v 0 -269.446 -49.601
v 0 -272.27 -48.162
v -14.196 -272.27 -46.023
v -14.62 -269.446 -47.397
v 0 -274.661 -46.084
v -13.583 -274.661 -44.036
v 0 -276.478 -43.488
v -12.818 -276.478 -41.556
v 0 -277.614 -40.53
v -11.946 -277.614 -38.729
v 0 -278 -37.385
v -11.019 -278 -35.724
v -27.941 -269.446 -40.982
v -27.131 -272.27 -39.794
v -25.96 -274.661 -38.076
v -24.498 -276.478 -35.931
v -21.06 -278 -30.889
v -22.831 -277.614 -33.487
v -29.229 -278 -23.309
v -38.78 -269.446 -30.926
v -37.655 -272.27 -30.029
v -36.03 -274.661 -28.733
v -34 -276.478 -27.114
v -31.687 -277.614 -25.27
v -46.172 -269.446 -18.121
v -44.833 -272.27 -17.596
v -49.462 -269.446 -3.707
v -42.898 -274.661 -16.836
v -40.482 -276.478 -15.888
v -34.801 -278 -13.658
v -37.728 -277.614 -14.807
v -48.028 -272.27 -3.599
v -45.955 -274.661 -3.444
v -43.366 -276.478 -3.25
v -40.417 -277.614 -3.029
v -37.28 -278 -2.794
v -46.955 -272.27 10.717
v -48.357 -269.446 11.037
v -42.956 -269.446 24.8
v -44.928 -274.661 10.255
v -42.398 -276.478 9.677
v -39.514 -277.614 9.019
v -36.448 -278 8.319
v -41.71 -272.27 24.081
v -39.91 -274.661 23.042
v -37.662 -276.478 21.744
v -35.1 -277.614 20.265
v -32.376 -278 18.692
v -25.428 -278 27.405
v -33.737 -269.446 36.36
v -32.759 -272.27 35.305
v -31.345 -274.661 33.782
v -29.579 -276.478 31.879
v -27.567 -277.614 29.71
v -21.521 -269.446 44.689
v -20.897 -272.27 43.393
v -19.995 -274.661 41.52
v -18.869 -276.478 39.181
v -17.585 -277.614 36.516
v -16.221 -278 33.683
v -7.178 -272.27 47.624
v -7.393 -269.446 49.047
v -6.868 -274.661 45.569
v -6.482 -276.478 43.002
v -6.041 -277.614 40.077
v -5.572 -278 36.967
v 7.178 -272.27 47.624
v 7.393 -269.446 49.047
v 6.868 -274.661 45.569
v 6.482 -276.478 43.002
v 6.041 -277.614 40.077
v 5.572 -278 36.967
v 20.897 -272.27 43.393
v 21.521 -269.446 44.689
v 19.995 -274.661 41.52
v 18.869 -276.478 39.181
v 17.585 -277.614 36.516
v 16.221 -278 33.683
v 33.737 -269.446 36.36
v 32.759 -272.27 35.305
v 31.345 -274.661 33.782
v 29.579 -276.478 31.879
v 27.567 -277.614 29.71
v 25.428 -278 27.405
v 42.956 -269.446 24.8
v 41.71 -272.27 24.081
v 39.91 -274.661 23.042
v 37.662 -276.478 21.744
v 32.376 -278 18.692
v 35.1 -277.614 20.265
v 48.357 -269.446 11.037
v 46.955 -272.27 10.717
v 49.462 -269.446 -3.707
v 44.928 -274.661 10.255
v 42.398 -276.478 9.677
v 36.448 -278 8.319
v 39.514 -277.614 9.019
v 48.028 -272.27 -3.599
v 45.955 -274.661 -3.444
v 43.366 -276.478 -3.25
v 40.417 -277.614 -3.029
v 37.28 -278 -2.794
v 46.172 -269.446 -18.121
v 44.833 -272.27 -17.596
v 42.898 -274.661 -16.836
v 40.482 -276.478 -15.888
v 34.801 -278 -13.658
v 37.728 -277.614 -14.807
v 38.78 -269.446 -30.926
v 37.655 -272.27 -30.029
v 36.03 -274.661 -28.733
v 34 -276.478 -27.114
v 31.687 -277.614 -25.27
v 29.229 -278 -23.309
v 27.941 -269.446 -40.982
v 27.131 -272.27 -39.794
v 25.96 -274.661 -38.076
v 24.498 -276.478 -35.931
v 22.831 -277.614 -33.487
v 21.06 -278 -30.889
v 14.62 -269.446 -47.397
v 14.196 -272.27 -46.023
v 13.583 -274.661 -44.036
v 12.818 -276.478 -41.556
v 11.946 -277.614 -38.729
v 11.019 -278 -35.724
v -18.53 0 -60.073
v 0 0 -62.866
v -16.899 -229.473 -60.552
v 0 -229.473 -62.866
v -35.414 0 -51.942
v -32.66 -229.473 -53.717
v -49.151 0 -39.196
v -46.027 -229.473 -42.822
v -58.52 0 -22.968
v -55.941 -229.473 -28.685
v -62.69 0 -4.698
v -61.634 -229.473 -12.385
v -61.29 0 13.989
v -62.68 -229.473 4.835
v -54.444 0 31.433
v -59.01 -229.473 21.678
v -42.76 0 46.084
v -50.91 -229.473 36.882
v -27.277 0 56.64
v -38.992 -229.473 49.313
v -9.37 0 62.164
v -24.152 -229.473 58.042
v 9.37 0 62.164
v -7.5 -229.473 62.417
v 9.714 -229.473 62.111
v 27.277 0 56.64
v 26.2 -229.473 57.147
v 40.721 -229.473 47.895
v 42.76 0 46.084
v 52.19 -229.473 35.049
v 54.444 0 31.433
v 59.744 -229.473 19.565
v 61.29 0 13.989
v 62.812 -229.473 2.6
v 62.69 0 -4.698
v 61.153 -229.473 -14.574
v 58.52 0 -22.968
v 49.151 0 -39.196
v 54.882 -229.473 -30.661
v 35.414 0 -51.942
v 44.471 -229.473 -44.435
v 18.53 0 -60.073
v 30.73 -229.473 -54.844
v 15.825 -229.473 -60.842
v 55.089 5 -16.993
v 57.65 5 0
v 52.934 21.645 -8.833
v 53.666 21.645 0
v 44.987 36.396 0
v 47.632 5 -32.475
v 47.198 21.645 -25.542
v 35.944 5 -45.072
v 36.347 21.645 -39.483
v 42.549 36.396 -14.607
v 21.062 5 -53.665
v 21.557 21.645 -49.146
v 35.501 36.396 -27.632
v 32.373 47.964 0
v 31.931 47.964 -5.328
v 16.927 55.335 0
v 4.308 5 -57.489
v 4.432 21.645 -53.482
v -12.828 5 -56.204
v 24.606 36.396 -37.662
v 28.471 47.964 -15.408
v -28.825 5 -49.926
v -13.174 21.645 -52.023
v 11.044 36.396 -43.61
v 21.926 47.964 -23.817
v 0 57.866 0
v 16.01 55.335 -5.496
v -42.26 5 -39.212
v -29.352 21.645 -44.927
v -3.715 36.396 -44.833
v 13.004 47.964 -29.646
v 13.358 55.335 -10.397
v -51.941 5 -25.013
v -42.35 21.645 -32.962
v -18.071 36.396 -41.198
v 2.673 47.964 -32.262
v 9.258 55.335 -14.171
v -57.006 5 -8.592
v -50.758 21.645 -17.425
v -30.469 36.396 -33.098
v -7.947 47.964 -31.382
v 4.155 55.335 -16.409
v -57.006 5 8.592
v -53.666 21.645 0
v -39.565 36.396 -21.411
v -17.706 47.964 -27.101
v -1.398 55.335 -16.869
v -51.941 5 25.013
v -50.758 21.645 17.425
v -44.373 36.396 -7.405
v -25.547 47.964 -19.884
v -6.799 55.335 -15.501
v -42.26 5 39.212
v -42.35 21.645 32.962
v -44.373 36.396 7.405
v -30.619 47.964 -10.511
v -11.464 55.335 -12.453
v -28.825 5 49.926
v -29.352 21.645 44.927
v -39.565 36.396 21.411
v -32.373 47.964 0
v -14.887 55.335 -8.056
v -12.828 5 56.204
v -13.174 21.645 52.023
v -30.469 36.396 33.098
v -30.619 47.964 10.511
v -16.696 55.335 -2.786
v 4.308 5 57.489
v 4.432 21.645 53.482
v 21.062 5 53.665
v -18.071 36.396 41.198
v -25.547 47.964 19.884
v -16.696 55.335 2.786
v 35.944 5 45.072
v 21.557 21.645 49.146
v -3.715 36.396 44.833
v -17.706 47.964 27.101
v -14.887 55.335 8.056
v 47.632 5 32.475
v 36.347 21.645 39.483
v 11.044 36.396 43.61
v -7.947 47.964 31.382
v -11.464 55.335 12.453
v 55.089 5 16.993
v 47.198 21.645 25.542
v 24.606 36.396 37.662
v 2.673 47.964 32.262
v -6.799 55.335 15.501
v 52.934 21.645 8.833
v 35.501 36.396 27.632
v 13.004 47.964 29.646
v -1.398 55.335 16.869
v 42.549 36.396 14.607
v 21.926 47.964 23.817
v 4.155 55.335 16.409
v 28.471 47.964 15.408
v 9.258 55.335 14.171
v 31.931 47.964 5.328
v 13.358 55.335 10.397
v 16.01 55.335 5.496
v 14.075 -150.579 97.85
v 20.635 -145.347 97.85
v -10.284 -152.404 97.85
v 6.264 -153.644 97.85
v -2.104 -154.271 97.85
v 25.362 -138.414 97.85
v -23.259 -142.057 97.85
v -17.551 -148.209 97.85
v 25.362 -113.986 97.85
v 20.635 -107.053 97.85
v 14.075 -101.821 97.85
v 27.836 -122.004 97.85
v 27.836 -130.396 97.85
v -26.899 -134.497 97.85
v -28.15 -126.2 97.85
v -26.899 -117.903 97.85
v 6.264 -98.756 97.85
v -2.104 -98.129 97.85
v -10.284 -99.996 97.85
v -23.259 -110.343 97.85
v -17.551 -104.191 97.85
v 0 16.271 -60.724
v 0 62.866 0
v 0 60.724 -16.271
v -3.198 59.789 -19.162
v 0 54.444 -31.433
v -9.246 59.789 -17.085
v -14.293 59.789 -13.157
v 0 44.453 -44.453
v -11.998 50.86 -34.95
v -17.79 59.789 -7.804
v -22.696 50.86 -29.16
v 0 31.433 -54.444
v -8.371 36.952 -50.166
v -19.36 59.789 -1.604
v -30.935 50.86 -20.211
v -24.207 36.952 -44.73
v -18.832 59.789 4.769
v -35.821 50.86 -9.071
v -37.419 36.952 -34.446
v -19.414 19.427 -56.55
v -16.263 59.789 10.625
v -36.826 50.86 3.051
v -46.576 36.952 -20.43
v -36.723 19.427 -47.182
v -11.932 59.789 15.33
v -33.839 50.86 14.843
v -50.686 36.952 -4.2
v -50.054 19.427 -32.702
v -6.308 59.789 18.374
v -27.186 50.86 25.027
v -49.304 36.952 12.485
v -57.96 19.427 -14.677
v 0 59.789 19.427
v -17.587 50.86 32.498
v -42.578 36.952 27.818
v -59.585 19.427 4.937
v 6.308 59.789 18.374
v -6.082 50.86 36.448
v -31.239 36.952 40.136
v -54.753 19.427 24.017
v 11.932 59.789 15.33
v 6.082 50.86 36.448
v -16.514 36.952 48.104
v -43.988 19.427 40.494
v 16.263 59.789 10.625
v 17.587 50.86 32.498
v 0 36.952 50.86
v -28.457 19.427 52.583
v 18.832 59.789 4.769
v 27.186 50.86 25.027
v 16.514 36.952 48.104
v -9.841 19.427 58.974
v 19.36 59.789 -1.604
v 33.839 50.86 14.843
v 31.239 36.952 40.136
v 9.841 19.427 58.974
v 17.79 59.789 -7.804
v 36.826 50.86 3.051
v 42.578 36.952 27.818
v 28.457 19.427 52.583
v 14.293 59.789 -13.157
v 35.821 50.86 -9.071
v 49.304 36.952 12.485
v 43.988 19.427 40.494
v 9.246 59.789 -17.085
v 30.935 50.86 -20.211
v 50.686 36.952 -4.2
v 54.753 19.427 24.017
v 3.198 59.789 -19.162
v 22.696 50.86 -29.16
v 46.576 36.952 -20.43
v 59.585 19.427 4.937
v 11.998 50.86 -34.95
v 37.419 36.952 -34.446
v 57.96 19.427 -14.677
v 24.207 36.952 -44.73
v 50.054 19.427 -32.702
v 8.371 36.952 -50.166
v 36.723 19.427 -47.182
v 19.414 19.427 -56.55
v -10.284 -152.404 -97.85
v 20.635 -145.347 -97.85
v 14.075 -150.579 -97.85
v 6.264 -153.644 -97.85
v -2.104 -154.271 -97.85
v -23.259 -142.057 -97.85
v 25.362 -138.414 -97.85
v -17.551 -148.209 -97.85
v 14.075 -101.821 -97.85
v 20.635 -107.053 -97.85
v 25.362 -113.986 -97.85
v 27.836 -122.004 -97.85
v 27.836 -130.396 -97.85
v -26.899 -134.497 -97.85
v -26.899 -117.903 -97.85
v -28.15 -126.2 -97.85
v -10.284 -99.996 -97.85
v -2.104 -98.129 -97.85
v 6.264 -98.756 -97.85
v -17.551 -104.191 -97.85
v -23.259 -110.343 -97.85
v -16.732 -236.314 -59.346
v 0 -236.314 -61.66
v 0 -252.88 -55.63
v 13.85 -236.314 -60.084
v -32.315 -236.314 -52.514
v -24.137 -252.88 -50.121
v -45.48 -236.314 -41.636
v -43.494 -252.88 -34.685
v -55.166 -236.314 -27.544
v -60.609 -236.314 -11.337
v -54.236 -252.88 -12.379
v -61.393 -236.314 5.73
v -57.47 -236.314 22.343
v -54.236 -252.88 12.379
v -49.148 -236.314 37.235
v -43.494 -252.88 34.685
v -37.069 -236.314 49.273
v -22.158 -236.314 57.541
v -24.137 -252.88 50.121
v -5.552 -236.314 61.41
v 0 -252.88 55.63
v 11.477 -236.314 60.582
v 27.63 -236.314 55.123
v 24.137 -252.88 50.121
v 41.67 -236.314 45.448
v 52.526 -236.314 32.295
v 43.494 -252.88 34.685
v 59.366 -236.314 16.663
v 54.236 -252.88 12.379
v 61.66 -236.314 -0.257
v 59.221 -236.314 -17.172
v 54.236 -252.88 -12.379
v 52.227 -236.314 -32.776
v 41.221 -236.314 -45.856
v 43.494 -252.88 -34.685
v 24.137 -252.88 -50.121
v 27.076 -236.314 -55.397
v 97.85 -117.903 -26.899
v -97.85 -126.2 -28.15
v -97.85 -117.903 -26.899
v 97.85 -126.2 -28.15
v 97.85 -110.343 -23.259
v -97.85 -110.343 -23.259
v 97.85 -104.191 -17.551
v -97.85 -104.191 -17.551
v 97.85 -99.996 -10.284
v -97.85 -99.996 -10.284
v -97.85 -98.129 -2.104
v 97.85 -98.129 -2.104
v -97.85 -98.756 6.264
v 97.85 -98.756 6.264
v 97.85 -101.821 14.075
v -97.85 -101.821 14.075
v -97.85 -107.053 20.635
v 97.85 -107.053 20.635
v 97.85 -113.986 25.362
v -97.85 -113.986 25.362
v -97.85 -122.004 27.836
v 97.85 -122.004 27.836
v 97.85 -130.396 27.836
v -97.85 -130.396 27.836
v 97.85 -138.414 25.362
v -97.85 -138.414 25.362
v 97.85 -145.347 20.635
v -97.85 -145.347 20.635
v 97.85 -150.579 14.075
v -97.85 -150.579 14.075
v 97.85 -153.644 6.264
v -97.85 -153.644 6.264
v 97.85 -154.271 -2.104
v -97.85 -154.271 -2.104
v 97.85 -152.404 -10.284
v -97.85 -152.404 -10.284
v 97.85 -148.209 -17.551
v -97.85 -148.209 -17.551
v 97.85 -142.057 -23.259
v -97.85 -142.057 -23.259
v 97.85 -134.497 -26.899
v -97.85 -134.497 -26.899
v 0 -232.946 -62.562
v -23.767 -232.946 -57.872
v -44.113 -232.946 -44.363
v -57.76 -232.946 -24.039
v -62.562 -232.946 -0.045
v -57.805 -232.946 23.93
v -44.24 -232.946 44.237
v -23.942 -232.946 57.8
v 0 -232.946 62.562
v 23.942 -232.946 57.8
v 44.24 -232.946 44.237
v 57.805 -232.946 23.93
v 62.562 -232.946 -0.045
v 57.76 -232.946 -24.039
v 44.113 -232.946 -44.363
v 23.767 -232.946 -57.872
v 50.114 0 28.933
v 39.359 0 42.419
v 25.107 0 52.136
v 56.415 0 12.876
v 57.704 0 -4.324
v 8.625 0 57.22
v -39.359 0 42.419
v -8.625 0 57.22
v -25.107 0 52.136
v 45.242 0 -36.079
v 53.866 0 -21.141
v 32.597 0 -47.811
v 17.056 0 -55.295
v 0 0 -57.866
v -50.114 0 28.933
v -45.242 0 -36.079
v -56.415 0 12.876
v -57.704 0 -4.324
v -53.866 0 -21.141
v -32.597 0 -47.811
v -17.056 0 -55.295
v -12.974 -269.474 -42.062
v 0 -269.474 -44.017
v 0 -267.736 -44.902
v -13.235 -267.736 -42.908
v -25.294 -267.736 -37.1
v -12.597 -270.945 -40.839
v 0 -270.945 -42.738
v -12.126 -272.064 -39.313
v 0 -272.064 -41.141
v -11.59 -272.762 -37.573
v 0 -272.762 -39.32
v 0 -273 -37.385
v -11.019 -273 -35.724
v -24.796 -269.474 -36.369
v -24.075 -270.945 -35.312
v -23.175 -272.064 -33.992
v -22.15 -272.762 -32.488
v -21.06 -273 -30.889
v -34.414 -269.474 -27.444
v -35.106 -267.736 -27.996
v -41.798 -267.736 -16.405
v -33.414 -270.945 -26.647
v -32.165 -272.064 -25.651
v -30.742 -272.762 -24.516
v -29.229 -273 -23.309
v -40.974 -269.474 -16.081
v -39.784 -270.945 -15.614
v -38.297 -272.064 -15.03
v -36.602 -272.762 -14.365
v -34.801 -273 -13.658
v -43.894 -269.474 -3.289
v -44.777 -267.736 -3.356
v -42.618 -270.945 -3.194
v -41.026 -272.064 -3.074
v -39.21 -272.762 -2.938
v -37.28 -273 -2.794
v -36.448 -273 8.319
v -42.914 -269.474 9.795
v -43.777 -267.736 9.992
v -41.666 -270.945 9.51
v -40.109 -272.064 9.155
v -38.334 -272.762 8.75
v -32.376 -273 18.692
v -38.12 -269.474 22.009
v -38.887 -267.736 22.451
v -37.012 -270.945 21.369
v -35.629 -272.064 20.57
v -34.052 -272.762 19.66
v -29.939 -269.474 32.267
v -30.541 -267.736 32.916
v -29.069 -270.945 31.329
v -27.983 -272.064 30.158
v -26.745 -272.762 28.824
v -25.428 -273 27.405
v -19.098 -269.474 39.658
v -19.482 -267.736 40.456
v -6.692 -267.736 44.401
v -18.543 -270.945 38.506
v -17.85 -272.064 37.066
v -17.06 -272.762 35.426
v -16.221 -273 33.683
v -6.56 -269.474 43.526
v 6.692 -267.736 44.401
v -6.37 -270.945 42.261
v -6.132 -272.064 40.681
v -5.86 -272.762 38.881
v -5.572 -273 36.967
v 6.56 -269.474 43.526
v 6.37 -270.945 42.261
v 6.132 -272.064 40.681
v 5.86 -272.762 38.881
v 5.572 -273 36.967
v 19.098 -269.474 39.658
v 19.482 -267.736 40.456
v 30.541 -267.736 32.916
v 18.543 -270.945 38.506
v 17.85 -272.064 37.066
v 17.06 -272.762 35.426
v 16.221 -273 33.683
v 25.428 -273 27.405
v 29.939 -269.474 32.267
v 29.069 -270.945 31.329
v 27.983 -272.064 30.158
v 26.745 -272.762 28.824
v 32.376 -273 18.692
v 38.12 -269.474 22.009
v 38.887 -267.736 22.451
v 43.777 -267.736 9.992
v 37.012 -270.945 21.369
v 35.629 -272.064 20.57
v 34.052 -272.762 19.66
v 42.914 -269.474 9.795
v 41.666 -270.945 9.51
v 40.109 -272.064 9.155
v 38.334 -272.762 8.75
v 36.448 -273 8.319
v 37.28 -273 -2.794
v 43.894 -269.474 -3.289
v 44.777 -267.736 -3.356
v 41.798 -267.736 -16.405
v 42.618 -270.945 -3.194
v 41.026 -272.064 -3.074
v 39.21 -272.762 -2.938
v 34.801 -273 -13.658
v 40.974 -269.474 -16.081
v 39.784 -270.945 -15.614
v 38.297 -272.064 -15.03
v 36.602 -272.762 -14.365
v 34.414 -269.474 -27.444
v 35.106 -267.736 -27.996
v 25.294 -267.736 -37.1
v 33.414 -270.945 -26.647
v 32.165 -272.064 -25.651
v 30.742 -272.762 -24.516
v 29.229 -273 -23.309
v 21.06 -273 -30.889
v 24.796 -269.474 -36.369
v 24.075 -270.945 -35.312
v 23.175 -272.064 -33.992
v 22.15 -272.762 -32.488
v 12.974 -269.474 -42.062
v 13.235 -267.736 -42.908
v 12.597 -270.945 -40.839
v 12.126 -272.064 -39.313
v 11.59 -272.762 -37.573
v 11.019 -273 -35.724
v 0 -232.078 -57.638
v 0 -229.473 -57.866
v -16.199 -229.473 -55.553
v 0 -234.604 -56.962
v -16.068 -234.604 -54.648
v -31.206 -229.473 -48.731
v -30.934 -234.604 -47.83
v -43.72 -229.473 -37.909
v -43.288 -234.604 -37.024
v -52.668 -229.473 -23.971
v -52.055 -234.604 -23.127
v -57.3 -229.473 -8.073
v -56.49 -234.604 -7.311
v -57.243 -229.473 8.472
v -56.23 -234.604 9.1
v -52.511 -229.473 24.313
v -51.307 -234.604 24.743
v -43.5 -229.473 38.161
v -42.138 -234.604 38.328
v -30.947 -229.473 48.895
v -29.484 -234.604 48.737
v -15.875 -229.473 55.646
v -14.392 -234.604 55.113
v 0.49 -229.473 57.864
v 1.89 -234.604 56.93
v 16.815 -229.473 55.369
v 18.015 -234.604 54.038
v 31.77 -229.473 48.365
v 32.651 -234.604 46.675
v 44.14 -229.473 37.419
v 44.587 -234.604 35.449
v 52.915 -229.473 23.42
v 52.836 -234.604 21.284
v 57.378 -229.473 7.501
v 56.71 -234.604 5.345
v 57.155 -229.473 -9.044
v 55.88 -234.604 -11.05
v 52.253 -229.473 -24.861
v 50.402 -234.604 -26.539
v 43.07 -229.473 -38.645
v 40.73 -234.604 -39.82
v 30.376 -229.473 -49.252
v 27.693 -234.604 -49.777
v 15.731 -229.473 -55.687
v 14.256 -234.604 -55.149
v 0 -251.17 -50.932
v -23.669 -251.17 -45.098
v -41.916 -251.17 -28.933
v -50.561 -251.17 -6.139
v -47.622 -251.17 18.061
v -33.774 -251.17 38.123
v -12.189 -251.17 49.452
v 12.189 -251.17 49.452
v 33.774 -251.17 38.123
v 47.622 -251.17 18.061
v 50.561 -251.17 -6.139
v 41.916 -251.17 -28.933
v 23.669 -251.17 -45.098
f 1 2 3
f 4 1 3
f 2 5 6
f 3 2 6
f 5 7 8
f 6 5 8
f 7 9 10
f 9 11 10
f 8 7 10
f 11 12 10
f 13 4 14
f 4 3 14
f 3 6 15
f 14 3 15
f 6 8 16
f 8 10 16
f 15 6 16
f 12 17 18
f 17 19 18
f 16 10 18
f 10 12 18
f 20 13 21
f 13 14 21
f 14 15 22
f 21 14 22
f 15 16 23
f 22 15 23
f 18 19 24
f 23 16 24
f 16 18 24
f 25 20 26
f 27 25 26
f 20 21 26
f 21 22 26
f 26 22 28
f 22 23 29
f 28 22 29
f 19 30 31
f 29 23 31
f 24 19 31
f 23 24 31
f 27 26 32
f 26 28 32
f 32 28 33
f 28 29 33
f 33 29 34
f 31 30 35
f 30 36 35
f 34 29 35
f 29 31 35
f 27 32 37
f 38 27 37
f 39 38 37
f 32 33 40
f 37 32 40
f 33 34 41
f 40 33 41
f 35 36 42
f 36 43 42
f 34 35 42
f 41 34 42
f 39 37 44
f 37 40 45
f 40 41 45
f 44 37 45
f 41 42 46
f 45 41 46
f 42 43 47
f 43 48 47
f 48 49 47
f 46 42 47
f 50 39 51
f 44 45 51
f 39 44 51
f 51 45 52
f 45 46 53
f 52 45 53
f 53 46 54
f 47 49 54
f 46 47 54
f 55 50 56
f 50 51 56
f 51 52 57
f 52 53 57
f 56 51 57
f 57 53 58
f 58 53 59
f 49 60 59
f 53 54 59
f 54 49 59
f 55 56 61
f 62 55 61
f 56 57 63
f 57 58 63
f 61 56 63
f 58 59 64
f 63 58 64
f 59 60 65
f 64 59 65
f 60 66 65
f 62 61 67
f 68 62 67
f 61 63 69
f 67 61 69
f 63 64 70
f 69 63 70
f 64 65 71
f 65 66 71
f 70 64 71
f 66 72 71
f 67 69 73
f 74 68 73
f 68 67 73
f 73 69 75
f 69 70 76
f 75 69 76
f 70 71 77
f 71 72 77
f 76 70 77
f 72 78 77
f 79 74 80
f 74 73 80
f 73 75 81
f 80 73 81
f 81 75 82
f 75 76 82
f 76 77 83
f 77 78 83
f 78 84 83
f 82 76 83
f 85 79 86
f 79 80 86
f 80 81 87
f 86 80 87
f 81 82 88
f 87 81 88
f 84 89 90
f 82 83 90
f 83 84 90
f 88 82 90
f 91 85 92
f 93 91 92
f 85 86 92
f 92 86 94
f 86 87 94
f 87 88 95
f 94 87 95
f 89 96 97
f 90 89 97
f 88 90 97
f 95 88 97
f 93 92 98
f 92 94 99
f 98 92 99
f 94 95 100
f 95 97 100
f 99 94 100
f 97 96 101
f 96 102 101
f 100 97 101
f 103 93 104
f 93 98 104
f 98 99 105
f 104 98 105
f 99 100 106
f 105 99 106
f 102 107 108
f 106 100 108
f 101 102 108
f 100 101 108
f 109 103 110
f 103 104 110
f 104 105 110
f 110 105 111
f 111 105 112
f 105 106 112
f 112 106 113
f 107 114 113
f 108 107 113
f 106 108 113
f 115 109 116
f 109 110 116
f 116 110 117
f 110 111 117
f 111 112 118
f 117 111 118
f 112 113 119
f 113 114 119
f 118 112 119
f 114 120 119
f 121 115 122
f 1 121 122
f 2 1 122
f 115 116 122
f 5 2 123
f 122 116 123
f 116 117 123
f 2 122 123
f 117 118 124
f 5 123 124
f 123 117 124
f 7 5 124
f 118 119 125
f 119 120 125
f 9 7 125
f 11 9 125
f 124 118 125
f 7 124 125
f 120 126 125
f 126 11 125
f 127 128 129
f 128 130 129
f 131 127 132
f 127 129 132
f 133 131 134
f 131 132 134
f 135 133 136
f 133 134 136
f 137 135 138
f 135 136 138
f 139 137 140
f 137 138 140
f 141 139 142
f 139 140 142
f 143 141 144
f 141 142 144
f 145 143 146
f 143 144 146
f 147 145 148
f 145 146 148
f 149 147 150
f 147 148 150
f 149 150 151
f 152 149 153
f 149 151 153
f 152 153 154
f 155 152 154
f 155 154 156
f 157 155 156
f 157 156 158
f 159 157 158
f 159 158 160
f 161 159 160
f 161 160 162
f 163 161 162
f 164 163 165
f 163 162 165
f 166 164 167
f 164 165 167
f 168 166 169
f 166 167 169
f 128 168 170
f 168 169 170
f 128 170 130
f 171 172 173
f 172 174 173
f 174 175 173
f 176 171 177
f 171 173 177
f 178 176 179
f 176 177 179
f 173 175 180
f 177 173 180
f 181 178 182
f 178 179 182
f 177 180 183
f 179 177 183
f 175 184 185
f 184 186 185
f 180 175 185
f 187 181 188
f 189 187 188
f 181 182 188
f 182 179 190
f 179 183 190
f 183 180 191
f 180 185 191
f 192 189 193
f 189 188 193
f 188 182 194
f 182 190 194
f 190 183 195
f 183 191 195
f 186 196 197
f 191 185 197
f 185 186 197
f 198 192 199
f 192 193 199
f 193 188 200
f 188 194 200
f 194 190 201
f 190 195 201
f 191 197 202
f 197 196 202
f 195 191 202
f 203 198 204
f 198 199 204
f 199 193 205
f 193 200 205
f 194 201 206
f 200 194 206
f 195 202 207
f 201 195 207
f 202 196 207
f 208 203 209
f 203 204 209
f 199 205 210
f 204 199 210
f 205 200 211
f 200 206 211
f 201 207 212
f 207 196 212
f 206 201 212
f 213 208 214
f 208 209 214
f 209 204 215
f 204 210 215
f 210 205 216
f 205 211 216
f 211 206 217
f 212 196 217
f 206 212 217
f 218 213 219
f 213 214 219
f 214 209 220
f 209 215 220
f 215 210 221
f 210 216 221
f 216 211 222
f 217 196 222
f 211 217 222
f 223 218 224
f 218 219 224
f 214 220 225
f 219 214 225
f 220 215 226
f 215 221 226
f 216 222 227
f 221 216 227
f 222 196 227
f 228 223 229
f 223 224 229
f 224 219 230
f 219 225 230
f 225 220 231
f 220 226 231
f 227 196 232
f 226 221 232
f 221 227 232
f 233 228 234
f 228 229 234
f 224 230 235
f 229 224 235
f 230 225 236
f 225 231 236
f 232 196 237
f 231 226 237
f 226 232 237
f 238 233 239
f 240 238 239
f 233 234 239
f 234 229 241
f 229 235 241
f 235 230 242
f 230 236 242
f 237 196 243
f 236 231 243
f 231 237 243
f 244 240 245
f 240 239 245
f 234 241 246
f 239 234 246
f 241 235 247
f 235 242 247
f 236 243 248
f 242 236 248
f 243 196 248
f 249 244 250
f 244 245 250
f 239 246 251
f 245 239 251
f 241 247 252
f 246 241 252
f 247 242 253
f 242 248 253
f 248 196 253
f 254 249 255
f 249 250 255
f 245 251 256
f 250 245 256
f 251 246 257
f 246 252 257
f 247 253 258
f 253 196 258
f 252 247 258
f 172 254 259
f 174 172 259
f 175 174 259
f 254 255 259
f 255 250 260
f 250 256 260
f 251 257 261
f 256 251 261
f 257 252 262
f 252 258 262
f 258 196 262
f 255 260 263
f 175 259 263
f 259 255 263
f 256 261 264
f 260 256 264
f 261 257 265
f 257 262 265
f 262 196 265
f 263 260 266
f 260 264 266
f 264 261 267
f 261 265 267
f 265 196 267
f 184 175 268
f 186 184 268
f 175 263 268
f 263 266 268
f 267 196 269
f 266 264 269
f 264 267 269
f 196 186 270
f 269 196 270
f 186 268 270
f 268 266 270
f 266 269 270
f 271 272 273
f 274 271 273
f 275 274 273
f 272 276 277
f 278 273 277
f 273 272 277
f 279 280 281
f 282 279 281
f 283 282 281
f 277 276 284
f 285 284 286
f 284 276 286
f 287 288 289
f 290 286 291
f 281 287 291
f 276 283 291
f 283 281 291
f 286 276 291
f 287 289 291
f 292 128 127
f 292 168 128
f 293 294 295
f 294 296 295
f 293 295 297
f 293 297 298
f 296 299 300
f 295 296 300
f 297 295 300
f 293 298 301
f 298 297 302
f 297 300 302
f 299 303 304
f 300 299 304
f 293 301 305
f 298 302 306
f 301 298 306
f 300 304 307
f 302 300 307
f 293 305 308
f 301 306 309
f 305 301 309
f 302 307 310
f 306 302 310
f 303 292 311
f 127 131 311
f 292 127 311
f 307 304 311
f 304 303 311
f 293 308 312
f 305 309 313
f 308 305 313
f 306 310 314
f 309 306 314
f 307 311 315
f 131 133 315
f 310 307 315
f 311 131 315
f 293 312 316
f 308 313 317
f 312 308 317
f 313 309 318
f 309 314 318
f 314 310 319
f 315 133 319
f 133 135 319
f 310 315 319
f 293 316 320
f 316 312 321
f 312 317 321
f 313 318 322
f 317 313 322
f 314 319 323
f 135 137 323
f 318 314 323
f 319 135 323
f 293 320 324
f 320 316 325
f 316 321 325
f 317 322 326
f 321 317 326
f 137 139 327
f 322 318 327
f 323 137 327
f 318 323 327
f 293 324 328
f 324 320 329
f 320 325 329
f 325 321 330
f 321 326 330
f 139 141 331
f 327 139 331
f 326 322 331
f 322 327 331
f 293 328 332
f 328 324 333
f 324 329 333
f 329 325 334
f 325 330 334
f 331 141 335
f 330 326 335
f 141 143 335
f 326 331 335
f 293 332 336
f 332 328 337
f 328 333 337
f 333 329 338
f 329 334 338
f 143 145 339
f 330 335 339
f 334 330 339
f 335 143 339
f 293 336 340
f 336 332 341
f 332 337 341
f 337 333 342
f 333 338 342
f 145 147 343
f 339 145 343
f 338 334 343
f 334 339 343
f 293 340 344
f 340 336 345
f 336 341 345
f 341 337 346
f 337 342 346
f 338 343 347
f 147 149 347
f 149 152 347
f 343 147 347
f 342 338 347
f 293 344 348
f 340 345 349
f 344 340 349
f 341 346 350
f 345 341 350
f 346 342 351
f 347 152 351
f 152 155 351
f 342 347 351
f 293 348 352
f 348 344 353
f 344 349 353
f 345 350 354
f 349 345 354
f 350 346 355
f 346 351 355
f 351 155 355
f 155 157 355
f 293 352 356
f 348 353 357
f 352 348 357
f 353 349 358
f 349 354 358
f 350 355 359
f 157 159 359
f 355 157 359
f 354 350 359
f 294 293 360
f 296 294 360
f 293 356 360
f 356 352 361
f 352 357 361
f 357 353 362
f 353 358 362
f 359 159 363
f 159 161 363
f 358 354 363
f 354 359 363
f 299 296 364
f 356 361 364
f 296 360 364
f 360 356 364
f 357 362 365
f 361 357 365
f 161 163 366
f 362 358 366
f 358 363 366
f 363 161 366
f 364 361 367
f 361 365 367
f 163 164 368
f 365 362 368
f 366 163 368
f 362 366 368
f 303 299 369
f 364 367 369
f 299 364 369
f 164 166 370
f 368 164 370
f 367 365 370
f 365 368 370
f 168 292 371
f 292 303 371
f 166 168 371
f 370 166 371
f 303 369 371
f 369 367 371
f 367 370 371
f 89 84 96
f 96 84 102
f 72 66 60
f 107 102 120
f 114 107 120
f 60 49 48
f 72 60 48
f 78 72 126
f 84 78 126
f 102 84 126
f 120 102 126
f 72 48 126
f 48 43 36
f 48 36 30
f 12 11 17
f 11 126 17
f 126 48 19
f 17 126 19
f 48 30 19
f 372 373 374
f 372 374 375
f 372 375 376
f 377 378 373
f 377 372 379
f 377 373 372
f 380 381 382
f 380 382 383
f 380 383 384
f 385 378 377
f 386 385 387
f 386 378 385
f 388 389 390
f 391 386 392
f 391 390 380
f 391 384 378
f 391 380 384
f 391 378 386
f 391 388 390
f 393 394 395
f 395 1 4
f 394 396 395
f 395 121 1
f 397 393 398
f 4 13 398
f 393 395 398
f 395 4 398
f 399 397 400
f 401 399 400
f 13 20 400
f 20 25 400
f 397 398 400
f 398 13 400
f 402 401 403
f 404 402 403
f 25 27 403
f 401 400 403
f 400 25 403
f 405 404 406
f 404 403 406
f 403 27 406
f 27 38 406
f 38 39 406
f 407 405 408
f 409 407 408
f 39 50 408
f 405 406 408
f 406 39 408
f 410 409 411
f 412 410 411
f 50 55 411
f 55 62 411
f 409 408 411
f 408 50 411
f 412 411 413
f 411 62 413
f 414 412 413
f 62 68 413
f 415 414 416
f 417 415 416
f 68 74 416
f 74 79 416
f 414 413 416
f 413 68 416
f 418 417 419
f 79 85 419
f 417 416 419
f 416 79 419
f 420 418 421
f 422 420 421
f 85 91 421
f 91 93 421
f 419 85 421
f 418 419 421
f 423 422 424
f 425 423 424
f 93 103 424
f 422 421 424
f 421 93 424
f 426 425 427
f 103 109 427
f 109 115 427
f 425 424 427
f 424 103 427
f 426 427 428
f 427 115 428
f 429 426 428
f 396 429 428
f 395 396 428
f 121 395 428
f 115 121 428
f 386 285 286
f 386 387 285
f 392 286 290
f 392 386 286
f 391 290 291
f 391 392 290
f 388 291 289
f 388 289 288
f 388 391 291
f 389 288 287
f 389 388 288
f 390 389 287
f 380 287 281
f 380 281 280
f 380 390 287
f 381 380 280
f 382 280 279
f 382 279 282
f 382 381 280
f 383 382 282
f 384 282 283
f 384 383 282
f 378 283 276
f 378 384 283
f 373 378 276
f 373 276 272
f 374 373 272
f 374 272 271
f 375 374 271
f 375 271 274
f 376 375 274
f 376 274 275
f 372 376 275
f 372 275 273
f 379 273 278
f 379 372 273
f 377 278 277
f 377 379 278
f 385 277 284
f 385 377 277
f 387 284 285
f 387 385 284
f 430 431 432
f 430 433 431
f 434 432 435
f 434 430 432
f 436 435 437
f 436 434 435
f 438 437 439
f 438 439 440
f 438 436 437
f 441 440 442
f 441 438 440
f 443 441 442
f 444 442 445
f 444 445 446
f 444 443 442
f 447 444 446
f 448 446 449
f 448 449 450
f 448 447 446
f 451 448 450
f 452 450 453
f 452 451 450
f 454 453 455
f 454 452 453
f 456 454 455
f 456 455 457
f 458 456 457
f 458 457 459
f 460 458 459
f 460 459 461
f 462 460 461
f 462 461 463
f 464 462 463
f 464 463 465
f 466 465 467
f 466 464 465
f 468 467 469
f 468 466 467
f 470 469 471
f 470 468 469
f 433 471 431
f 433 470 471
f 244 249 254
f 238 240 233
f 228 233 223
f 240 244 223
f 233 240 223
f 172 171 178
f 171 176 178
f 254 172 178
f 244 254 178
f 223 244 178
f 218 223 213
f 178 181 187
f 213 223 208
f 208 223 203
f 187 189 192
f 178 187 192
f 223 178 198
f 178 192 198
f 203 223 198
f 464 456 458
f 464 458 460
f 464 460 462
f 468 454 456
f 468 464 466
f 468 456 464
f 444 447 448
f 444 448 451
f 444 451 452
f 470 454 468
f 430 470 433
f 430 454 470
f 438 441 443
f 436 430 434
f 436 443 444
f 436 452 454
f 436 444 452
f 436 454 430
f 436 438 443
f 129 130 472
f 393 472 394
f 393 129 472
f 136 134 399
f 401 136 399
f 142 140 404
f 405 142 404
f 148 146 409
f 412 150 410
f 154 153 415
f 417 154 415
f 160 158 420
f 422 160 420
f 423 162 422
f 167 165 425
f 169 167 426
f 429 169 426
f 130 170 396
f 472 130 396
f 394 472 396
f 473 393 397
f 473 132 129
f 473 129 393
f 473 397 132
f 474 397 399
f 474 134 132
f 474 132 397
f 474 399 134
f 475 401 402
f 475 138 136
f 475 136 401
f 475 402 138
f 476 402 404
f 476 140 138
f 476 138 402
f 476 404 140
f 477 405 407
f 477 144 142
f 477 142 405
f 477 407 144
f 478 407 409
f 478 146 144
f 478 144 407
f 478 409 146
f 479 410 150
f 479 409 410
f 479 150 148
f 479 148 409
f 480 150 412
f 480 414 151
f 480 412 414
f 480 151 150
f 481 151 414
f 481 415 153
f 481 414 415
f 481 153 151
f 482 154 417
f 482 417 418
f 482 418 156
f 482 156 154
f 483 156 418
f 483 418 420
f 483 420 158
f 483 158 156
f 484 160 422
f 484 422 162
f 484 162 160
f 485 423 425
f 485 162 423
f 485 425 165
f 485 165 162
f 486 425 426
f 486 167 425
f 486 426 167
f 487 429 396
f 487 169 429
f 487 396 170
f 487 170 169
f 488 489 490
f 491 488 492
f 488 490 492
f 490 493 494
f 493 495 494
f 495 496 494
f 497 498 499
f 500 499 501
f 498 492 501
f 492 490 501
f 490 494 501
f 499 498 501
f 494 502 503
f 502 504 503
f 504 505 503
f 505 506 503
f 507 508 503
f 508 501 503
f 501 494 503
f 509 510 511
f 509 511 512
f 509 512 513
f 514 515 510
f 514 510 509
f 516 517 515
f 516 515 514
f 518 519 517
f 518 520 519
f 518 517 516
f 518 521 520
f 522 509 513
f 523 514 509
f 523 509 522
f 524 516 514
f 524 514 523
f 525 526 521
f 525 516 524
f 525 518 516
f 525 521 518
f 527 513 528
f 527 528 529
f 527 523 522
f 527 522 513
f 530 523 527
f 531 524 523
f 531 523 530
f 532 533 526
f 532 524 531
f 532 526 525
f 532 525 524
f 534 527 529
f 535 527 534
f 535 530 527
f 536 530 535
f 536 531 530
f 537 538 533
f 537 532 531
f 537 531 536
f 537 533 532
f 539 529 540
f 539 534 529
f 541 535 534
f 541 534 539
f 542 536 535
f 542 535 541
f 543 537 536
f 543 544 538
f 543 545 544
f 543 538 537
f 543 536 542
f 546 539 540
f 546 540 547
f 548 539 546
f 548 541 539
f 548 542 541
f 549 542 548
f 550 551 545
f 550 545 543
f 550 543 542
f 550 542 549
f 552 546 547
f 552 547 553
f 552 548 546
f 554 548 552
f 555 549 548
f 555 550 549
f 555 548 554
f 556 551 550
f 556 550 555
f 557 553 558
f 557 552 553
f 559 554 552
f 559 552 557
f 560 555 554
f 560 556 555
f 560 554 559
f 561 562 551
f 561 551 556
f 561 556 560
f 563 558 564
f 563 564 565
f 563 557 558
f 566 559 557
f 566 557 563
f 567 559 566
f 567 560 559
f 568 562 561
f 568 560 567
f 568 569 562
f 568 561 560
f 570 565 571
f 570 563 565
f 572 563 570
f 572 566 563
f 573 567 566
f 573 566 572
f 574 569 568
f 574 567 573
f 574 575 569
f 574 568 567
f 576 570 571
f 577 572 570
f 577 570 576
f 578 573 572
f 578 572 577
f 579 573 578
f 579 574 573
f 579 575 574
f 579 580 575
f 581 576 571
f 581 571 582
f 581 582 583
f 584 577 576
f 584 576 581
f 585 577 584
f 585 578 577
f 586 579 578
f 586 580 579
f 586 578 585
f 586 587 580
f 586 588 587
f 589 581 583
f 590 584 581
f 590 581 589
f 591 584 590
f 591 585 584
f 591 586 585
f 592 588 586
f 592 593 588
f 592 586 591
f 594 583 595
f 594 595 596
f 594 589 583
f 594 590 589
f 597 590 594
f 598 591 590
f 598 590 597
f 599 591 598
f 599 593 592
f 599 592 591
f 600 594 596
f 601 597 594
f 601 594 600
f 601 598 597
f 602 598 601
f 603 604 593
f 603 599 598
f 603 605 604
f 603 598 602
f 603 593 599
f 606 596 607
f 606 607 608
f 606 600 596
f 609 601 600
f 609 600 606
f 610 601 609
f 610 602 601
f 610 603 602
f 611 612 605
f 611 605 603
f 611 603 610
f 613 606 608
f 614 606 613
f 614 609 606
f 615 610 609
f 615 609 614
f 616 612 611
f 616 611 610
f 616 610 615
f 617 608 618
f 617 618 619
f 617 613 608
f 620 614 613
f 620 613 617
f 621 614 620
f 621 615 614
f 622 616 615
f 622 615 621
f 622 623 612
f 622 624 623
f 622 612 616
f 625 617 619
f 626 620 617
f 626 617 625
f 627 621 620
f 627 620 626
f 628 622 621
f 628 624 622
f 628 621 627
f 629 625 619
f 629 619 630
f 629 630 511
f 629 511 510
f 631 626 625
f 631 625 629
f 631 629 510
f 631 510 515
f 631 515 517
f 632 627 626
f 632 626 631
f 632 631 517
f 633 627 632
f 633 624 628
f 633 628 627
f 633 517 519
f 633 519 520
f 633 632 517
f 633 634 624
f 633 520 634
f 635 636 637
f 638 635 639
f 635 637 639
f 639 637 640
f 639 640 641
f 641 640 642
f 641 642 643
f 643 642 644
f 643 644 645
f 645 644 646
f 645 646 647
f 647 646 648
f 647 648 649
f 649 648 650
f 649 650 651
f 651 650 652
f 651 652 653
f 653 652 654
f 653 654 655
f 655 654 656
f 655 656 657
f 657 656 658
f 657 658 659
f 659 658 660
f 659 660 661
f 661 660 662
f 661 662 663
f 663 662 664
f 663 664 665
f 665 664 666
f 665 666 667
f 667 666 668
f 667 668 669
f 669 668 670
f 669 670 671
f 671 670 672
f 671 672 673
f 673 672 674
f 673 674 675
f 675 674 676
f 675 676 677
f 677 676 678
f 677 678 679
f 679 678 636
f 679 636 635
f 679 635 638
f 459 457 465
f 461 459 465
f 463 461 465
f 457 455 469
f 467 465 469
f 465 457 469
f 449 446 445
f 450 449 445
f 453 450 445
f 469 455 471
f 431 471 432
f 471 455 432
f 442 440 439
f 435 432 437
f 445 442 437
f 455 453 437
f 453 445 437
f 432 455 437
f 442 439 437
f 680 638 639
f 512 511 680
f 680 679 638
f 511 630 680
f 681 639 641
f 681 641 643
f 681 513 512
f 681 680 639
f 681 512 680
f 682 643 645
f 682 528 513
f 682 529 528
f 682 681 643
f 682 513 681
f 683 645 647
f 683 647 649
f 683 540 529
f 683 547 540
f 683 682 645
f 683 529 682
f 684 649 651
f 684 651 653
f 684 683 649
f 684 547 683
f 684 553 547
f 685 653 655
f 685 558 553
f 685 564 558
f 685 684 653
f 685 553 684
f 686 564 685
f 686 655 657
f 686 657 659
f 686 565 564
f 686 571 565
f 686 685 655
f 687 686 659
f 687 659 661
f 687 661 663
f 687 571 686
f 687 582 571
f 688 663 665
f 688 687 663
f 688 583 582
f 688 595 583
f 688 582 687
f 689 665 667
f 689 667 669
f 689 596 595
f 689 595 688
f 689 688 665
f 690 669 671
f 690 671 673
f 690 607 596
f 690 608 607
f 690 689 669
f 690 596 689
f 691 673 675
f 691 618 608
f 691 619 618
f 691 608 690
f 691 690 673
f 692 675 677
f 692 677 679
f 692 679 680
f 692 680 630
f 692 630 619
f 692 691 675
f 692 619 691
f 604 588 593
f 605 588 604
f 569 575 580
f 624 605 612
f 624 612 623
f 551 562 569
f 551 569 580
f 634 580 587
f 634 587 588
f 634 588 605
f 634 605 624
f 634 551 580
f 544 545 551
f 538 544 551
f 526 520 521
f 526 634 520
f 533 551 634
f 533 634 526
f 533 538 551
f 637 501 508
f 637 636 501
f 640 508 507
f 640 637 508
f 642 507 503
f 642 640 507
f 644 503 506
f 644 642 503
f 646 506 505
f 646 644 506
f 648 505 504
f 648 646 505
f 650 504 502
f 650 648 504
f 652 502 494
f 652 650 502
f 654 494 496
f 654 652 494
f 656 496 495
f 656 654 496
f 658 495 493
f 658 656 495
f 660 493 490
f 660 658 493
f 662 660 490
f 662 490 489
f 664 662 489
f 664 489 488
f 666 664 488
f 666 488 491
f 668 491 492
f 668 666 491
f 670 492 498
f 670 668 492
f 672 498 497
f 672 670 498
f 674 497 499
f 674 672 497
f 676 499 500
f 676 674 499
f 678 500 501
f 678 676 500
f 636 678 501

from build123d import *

# Parameters (mm, degrees)
FILLET1_R             = 20
FILLET2_R             = 13
SHELL6_T              = -5
SKETCH3_R             = 28.15
BOSS_EXTRUDE1_DEPTH   = 97.85
BODY_MOVE_COPY1_ANGLE = 90


# Read off the part's stored shape, not the designer's step: Shell8
with BuildPart() as part:
    # Sketch1 → Revolve1 (revolve)
    with BuildSketch(Plane.XY, mode=Mode.PRIVATE) as revolve1_sk:
        Polygon((0, 0), (62.866205, 0), (62.866205, -233), (46.487544458, -278), (0, -278), align=None)
    revolve(revolve1_sk.sketch.rotate(Axis((0, -278, 0), (0, 1, 0)), 90), axis=Axis((0, -278, 0), (0, 1, 0)))

    # Fillet1
    fillet1_edges = [part.edges().sort_by_distance(p)[0] for p in [
        (0, -233, 62.866205),
    ]]
    fillet(fillet1_edges, radius=FILLET1_R)

    # Fillet2
    fillet2_edges = [part.edges().sort_by_distance(p)[0] for p in [
        (0, -278, 46.487544458),
    ]]
    fillet(fillet2_edges, radius=FILLET2_R)

    # Shell6
    shell6_openings = [part.faces().sort_by_distance(p)[0] for p in [
        (0, 0, 0),
    ]]
    offset(amount=SHELL6_T, openings=shell6_openings, kind=Kind.INTERSECTION)


with BuildPart() as body_2:
    # Sketch2 → Revolve3 (revolve)
    with BuildSketch(Plane(origin=(0, 0, 0), x_dir=(0, 0, -1), z_dir=(1, 0, 0)), mode=Mode.PRIVATE) as revolve3_sk:
        with BuildLine():
            Line((-62.866205, 0), (0, 0))
            Line((0, 0), (0, 62.866205))
            ThreePointArc((0, 62.866205), (-44.453119863, 44.453119863), (-62.866205, 0))
        make_face()
    revolve(revolve3_sk.sketch.rotate(Axis((0, 0, 0), (0, 1, 0)), 180), axis=Axis((0, 0, 0), (0, 1, 0)))

    # Shell8 outline → Shell8 (revolve, cut)
    with BuildSketch(Plane.XY):
        with BuildLine():
            Line((0, 5), (57.64978475, 4.999999942))
            ThreePointArc((57.64978475, 4.999999942), (39.109887877, 42.648732119), (0, 57.866205))
            Line((0, 57.866205), (0, 5))
        make_face()
    revolve(axis=Axis((0, 0, 0), (0, 1, 0)), mode=Mode.SUBTRACT)


with BuildPart() as part_1:
    add(part.part)

    # Combine1: union body 2
    add(body_2.part)


with BuildPart() as body_2_2:
    # Sketch3 → Boss-Extrude1 (new, symmetric)
    with BuildSketch(Plane(origin=(0, 0, 0), x_dir=(0, 0, -1), z_dir=(1, 0, 0))):
        with Locations((0, -126.2)):
            Circle(SKETCH3_R)
    extrude(amount=BOSS_EXTRUDE1_DEPTH, both=True)


with BuildPart() as body_3:
    # Body-Move/Copy1: copy of body 2 2
    add(body_2_2.part.rotate(Axis((0, 0, 0), (0, 1, 0)), BODY_MOVE_COPY1_ANGLE))


solid = Compound([part_1.part, body_2_2.part, body_3.part])
